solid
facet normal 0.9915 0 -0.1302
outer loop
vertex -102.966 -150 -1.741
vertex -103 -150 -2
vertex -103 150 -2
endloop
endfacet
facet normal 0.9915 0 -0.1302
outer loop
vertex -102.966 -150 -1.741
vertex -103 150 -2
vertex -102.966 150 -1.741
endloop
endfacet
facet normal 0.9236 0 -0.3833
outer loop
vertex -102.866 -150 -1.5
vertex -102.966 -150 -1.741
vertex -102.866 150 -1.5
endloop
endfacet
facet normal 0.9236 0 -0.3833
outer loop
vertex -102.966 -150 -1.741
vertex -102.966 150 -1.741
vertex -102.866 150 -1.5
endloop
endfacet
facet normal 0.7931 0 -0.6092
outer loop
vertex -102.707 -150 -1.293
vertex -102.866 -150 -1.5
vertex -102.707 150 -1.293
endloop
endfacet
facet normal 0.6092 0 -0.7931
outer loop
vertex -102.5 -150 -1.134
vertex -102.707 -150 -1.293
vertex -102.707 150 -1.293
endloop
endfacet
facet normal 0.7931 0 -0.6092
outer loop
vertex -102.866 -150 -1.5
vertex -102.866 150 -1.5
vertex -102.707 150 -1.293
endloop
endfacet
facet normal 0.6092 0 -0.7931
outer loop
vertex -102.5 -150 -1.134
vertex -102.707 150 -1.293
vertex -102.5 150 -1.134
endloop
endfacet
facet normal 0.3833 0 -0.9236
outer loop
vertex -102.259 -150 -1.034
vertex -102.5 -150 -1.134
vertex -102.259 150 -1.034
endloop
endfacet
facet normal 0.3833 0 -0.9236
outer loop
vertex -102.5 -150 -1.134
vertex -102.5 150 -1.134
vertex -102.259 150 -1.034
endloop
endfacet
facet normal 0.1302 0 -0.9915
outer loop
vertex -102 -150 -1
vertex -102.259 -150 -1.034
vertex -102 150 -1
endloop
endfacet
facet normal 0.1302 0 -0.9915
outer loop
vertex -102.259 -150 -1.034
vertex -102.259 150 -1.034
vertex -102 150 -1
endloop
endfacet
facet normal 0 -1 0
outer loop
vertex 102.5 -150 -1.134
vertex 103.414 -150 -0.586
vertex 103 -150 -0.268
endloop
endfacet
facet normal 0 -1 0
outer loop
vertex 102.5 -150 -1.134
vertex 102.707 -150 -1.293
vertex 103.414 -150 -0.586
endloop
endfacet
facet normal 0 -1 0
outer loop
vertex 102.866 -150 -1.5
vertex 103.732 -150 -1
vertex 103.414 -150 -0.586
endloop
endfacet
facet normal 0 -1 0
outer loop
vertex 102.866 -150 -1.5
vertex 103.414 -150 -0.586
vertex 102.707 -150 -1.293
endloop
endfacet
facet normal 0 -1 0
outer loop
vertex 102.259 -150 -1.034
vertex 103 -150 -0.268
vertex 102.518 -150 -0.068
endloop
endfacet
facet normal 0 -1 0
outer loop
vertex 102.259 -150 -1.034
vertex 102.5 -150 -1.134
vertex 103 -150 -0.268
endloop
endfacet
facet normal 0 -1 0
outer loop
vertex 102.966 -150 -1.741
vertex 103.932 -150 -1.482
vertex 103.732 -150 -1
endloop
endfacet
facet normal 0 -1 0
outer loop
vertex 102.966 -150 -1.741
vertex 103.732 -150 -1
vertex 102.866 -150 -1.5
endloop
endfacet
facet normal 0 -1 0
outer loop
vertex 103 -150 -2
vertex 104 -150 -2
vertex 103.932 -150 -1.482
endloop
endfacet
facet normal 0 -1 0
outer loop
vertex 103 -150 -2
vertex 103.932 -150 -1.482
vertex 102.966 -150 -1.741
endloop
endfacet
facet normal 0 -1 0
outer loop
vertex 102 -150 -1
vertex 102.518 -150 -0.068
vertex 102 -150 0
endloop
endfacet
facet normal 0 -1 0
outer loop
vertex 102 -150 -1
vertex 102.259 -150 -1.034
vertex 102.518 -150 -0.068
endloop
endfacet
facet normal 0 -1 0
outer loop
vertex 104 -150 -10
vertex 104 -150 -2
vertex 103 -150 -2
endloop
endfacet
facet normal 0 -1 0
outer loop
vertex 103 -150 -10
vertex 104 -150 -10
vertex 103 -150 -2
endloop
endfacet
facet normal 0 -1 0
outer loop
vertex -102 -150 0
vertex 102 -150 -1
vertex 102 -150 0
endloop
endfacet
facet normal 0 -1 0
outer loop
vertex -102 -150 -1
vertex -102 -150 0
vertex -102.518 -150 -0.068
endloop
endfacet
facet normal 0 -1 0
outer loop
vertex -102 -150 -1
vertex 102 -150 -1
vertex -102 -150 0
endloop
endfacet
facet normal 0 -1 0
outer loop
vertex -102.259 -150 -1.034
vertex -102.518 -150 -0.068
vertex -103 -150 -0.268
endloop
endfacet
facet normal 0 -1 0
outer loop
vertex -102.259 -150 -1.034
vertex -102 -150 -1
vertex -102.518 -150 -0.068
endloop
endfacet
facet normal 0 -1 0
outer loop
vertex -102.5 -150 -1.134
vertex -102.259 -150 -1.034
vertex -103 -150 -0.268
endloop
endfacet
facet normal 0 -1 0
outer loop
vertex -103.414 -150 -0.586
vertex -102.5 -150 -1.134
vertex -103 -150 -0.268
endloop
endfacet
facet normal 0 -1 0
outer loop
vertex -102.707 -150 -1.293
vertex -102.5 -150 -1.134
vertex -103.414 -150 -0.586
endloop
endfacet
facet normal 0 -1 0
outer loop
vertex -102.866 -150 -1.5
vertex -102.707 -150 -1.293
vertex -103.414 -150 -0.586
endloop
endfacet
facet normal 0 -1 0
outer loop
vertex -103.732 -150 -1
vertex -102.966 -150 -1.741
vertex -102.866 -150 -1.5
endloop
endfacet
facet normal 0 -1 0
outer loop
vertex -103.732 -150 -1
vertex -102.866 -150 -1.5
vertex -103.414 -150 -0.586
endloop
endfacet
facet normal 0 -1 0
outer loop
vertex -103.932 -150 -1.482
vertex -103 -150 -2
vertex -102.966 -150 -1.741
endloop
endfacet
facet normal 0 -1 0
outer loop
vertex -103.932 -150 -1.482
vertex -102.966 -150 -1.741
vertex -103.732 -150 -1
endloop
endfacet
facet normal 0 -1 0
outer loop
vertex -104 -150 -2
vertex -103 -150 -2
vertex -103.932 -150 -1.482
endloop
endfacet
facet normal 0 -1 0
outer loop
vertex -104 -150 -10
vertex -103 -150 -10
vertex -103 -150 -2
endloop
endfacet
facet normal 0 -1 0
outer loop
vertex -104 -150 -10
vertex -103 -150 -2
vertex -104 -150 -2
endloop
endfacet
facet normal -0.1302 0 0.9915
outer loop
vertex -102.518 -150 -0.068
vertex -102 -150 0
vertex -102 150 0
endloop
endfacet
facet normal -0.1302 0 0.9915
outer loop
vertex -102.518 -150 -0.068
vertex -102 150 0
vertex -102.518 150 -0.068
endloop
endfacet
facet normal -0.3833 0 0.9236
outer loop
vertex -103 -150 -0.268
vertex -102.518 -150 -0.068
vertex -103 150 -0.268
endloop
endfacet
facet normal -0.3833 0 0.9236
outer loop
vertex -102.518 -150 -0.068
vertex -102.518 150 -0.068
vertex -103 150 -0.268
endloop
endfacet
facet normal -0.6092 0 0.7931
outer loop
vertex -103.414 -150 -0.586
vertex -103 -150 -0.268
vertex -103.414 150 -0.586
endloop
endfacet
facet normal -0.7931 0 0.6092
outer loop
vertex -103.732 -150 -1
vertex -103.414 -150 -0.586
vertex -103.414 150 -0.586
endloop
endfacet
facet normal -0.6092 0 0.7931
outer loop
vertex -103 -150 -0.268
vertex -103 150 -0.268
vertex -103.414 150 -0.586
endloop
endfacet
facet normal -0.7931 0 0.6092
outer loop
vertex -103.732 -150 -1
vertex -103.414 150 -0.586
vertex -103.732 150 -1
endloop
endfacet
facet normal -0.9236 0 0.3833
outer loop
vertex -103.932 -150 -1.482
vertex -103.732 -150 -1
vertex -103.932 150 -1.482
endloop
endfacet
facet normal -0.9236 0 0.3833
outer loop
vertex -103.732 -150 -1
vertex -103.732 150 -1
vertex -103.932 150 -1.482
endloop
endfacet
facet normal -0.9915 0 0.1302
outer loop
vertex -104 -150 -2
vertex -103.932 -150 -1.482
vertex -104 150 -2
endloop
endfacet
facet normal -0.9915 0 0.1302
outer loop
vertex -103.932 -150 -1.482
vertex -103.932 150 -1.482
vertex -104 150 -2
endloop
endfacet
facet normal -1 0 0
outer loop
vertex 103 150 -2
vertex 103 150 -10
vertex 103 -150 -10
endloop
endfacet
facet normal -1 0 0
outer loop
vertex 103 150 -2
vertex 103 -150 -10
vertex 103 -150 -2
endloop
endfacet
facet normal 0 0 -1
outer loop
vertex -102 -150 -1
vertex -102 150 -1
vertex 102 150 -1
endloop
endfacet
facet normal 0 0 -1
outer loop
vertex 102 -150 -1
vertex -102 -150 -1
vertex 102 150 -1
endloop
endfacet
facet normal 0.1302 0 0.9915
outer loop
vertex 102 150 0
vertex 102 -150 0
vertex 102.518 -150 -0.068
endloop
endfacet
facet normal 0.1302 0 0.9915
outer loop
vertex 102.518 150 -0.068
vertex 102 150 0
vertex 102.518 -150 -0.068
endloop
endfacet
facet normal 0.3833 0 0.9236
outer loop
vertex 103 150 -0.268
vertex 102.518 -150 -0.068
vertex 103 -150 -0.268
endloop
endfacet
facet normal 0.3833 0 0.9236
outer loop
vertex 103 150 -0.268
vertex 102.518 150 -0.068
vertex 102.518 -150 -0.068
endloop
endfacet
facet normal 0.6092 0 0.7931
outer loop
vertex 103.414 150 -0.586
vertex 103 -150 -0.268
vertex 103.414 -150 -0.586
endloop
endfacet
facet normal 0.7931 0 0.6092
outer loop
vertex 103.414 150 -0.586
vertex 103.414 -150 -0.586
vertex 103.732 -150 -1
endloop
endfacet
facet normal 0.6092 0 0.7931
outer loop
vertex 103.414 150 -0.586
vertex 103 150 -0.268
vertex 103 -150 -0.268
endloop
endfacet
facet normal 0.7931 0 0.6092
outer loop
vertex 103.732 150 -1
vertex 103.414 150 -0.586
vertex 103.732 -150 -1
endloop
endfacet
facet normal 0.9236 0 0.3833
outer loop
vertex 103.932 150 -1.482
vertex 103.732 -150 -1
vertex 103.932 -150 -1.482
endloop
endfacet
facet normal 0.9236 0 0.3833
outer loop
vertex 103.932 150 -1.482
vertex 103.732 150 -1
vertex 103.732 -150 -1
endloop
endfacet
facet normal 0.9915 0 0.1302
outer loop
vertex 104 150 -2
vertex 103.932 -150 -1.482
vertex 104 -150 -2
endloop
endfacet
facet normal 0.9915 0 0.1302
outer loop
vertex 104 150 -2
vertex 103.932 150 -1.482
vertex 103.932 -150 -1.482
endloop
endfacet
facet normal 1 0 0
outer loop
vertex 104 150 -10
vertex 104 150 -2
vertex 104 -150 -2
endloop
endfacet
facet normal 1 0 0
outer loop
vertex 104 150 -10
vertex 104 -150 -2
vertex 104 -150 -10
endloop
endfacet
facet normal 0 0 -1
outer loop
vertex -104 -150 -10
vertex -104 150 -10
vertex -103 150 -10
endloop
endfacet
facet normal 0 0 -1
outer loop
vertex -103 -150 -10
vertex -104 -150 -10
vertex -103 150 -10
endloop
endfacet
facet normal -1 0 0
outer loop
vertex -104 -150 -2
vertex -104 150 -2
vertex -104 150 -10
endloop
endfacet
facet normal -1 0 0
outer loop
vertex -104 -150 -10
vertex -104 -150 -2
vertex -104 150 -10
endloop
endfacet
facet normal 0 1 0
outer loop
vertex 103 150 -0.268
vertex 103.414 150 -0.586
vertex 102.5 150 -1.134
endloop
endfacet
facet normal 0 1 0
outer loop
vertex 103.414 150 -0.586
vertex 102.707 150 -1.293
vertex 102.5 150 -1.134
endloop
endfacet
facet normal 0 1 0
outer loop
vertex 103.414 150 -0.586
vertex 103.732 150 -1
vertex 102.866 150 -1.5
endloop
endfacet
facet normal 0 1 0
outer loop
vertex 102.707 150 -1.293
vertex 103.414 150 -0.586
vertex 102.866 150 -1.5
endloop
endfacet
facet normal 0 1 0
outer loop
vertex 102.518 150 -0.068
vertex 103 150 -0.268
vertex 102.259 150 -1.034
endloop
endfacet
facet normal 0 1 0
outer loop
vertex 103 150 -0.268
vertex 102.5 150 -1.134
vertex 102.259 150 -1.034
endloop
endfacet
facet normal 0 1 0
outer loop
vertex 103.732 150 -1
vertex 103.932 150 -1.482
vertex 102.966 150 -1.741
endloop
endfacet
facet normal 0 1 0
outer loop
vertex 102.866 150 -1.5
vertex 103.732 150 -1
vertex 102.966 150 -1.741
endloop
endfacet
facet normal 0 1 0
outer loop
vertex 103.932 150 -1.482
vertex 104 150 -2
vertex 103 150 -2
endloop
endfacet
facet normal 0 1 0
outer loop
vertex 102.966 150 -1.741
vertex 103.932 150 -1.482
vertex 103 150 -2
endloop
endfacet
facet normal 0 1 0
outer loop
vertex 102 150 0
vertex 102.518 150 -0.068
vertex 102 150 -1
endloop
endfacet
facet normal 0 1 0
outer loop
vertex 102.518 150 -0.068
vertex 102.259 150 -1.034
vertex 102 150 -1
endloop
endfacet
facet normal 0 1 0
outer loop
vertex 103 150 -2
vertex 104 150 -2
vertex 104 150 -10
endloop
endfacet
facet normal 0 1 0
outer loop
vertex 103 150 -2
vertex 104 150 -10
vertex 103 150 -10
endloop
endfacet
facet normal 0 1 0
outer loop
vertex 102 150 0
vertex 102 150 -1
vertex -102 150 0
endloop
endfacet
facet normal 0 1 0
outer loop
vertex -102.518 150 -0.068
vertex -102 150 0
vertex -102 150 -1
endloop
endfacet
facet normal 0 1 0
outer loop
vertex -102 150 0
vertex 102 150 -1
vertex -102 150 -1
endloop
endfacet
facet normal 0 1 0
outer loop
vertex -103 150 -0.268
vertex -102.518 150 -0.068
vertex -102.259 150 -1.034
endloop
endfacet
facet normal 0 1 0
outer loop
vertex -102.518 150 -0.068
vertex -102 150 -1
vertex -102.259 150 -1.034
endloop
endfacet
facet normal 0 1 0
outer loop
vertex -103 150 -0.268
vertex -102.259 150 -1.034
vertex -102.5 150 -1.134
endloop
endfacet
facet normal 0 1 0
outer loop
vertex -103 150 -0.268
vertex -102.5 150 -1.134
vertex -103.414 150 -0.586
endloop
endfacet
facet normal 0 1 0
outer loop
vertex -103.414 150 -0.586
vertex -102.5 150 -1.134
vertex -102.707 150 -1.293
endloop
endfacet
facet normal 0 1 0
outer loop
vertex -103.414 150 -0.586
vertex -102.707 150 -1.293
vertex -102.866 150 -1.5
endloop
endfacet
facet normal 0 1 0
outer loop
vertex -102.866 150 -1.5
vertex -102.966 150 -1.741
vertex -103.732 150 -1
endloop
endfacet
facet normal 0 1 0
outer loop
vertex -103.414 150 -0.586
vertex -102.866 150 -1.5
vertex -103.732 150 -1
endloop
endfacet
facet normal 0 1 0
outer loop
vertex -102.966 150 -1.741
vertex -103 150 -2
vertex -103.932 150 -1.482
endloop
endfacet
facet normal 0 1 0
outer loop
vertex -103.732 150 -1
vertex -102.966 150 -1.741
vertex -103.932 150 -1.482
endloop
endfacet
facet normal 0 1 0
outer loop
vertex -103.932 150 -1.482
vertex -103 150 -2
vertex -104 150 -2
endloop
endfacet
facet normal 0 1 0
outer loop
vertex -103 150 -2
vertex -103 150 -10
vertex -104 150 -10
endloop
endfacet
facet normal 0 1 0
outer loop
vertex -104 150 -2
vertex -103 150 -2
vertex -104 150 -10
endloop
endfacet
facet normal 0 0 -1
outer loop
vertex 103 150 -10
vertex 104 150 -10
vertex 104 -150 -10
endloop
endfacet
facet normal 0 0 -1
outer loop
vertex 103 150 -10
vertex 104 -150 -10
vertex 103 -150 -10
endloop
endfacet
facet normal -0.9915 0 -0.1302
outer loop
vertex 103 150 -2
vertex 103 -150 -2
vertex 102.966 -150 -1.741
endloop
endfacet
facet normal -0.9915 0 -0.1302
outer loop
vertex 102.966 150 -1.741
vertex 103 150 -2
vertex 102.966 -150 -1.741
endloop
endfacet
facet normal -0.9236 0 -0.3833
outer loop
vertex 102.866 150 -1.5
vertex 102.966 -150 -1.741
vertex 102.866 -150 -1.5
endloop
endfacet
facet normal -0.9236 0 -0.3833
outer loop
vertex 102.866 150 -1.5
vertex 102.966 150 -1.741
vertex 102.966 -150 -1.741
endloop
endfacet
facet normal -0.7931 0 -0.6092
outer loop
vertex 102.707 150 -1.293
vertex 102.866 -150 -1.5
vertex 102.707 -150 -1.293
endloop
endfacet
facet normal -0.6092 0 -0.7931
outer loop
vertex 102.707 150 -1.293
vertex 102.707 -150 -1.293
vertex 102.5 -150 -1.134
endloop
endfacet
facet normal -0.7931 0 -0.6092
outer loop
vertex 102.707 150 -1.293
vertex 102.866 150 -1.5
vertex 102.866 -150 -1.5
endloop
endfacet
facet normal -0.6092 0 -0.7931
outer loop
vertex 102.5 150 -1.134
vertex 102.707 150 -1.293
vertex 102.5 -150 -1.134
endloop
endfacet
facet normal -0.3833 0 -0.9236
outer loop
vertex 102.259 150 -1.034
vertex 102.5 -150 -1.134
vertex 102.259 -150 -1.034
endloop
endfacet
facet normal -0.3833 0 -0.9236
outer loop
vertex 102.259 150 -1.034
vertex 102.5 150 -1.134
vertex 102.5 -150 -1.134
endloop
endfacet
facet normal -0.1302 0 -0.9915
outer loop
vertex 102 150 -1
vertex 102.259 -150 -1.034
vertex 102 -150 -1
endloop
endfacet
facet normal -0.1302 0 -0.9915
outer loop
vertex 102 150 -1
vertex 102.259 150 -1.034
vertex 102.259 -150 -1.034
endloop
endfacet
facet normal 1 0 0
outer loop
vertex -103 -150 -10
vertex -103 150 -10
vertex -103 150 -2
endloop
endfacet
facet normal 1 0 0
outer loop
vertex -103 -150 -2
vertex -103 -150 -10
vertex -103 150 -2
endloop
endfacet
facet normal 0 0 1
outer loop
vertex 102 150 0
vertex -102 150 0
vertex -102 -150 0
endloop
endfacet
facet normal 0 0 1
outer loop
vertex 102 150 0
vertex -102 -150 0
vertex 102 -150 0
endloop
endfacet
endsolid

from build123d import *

# Parameters (mm, degrees)
SKETCH1_W          = 204
SKETCH1_H          = 300
BASE_FLANGE1_DEPTH = 1
EDGE_FLANGE1_DEPTH = 300


# Sheet-metal steps are written as plain solids
with BuildPart() as part:
    # Sketch1 → Base-Flange1 (new body)
    with BuildSketch(Plane.XY):
        Rectangle(SKETCH1_W, SKETCH1_H)
    extrude(amount=-BASE_FLANGE1_DEPTH)

    # Edge-Flange1 section (across the edge) → Edge-Flange1 (add)
    with BuildSketch(Plane(origin=(103, 150, -1), x_dir=(-1, 0, 0), z_dir=(0, -1, 0))):
        with BuildLine():
            Line((-1, 1), (-1, 9))
            Line((-1, 9), (0, 9))
            Line((0, 9), (0, 1))
            ThreePointArc((0, 1), (0.292893219, 0.292893219), (1, 0))
            Line((1, 0), (1, -1))
            ThreePointArc((1, -1), (-0.414213562, -0.414213562), (-1, 1))
        make_face()
    edge_flange1 = extrude(amount=EDGE_FLANGE1_DEPTH)

    # Mirror1: Edge-Flange1 across plane
    add(edge_flange1.mirror(Plane(origin=(0, 0, 0), x_dir=(0, 0, 1), z_dir=(1, 0, 0))))


solid = part.part
